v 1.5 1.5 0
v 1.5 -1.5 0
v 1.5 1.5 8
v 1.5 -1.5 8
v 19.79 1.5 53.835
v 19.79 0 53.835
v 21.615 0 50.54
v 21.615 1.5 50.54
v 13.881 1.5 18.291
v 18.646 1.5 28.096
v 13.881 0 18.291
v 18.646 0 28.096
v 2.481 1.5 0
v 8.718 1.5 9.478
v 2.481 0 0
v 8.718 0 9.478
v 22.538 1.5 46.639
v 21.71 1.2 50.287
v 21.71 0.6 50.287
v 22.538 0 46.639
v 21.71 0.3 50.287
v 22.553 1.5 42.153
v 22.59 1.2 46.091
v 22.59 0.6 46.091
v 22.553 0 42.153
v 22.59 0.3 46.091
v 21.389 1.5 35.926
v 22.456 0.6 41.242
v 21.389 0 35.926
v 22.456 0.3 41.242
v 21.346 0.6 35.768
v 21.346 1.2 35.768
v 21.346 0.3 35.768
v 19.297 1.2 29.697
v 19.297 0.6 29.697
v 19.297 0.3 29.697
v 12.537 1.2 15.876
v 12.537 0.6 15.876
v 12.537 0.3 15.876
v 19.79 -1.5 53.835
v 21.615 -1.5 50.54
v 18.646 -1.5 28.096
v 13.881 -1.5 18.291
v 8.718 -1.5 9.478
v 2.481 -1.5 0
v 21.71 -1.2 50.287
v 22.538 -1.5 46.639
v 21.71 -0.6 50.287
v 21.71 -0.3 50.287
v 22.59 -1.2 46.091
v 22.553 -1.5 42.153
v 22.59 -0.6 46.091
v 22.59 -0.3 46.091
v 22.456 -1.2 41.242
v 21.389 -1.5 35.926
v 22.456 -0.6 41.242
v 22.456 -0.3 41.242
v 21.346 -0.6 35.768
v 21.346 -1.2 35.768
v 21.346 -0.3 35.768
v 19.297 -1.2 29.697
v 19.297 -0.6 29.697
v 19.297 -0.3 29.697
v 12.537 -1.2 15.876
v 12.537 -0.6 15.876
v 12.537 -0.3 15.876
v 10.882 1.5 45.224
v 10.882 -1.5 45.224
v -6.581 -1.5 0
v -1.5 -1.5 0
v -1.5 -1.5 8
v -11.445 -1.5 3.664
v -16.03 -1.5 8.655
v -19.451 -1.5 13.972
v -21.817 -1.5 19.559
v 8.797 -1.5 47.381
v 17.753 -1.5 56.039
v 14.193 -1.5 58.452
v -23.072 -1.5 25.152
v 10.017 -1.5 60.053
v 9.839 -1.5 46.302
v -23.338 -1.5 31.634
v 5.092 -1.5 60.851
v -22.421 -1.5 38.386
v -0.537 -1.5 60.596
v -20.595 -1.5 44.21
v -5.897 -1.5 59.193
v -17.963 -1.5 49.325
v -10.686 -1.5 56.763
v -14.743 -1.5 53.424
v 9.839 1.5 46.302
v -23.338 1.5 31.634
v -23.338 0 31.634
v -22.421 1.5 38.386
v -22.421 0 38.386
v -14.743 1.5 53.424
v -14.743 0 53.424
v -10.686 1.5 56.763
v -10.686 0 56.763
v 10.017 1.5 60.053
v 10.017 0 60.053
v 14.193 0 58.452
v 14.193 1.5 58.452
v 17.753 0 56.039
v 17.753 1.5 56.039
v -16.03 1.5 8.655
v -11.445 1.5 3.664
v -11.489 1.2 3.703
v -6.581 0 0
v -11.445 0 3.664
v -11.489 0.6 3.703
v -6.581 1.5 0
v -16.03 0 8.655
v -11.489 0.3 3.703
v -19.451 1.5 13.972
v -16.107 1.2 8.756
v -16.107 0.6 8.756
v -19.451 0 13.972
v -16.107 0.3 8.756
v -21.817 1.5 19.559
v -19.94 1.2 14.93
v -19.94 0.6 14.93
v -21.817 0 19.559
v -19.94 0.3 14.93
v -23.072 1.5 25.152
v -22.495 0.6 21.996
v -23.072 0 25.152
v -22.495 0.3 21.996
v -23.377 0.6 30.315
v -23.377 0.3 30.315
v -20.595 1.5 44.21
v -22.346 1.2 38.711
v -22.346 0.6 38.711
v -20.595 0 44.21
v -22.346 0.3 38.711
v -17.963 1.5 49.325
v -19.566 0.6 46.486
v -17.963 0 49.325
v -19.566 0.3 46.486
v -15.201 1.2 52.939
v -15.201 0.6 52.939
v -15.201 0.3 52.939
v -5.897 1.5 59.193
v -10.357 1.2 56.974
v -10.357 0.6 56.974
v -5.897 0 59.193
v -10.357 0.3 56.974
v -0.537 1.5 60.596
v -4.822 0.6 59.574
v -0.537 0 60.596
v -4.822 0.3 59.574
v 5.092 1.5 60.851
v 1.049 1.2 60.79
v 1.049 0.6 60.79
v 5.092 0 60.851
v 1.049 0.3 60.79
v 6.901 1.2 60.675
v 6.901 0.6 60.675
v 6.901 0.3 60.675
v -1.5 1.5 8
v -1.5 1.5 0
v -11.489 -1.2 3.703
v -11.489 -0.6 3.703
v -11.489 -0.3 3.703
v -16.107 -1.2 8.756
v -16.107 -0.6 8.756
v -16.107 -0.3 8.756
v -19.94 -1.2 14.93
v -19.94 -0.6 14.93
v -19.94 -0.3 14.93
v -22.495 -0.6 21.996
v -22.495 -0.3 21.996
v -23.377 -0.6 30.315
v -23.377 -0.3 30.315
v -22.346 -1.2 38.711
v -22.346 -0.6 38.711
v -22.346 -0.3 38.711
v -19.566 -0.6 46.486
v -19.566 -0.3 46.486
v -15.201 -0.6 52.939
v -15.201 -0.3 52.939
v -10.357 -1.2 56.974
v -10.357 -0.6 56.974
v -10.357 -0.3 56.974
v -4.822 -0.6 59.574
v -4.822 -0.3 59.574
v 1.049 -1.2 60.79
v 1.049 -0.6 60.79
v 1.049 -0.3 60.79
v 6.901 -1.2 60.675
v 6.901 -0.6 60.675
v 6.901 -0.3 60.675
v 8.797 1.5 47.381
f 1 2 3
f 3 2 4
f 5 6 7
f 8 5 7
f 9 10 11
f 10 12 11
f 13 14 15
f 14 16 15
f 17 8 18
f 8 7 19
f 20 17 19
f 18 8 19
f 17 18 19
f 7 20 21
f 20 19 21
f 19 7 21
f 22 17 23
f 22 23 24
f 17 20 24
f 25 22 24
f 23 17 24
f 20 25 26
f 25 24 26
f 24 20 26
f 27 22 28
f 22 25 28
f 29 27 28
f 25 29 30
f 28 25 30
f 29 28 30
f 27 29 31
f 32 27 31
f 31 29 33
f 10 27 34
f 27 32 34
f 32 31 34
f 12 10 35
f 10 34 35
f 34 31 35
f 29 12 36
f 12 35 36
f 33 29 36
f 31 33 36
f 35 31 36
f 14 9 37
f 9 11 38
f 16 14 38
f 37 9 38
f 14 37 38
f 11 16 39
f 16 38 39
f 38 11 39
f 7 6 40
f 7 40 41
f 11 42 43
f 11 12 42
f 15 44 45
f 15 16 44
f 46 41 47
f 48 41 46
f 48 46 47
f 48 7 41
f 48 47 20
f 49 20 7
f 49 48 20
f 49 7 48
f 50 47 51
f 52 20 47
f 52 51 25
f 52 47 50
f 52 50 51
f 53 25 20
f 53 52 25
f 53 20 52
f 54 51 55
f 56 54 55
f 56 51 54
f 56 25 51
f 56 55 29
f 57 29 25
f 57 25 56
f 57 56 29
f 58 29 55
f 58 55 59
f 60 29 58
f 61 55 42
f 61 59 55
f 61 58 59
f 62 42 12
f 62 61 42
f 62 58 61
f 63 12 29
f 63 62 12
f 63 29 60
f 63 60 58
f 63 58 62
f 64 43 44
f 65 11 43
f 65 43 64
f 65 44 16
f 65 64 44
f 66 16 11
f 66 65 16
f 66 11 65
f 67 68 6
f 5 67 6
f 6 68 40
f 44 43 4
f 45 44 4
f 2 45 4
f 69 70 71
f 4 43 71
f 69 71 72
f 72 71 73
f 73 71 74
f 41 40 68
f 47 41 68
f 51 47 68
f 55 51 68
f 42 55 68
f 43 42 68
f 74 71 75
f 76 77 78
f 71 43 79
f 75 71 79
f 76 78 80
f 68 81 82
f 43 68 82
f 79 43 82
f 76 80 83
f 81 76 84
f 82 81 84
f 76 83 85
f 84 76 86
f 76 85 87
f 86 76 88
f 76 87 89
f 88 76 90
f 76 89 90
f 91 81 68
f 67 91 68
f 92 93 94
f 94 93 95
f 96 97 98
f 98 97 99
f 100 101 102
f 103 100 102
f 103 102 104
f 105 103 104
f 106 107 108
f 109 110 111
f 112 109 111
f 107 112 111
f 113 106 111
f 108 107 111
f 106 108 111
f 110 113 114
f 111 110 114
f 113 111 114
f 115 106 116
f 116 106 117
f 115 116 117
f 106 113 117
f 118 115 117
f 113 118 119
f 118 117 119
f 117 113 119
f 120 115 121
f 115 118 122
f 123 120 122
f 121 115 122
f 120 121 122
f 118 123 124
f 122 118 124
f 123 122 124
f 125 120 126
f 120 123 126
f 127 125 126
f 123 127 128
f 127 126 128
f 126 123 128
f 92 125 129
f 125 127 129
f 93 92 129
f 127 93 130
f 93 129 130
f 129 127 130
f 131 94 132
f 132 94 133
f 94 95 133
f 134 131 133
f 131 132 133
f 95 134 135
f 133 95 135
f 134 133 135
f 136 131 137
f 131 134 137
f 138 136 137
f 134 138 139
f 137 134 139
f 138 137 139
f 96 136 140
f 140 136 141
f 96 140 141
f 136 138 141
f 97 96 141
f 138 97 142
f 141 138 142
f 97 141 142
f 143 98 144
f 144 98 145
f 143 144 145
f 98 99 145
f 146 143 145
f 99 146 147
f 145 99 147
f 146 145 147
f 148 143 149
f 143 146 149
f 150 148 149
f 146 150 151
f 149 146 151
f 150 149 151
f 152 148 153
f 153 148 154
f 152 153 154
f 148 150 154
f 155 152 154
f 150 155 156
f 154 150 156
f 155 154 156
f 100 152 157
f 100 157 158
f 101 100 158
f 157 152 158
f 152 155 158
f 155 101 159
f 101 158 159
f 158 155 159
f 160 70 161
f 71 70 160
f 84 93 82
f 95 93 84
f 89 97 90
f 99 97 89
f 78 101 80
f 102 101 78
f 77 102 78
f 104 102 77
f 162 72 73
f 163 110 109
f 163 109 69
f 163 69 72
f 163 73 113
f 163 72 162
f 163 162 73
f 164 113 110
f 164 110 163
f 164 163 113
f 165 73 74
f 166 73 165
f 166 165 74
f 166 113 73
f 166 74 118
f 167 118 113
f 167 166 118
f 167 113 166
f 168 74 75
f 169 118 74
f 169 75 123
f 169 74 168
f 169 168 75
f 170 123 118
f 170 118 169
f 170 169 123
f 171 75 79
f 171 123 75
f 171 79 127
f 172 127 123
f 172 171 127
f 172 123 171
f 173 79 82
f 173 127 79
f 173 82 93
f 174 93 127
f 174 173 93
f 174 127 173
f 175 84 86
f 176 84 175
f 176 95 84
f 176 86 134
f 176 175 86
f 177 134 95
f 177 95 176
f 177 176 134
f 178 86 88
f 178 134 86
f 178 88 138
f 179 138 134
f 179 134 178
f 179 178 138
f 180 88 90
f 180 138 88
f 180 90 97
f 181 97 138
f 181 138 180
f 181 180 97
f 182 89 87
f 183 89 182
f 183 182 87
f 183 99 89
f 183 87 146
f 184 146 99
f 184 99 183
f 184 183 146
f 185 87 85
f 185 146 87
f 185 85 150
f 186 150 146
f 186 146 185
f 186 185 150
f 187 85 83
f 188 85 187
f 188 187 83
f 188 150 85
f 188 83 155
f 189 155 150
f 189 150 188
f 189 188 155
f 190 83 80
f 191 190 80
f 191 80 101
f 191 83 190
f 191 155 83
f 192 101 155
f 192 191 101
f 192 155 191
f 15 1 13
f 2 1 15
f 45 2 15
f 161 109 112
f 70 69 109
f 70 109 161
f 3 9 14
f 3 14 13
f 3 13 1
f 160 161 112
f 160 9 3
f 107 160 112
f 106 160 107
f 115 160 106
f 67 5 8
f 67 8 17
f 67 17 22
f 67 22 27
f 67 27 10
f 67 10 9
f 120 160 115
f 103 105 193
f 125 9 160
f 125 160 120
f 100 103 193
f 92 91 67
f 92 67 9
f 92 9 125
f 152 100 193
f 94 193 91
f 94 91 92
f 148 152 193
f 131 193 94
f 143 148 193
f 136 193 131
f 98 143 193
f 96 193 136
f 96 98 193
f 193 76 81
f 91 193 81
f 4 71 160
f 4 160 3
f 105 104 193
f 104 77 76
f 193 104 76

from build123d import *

# Parameters (mm, degrees)
F2_DEPTH = 1.5
F3_W     = 3
F3_H     = 16
F4_DEPTH = 25


with BuildPart() as f2:
    # F1 (on Front) → F2 (new body, symmetric)
    with BuildSketch(Plane.XZ):
        with BuildLine():
            add(Edge.make_bspline(
                [(-6.5811700188, 0), (-13.0977069694, 3.9364622169), (-27.8054503735, 20.8943752102), (-19.4177727212, 56.5137920169), (6.8547689493, 63.7937351975), (29.7863310593, 50.168239492), (17.9522950202, 22.4377531558), (2.4807401933, 0)],
                knots=[0, 0, 0, 0, 0.1910098898, 0.3977067511, 0.5751034644, 0.7310175316, 1, 1, 1, 1], degree=3))
            Line((-6.5811700188, 0), (2.4807401933, 0))
        make_face()
    extrude(amount=F2_DEPTH, both=True)

    # F3 (on face) → F4 (cut)
    with BuildSketch(Plane.XZ.offset(1.5)):
        Polygon((9.8393275162, 46.3023560938), (10.8818753603, 45.2238877389), (28.8563479428, 62.5996851417), (27.8138000986, 63.6781534966), (26.7712522544, 64.7566218516), (8.796779672, 47.3808244488), align=None)
        Rectangle(F3_W, F3_H)
    extrude(amount=-F4_DEPTH, mode=Mode.SUBTRACT)


solid = f2.part
